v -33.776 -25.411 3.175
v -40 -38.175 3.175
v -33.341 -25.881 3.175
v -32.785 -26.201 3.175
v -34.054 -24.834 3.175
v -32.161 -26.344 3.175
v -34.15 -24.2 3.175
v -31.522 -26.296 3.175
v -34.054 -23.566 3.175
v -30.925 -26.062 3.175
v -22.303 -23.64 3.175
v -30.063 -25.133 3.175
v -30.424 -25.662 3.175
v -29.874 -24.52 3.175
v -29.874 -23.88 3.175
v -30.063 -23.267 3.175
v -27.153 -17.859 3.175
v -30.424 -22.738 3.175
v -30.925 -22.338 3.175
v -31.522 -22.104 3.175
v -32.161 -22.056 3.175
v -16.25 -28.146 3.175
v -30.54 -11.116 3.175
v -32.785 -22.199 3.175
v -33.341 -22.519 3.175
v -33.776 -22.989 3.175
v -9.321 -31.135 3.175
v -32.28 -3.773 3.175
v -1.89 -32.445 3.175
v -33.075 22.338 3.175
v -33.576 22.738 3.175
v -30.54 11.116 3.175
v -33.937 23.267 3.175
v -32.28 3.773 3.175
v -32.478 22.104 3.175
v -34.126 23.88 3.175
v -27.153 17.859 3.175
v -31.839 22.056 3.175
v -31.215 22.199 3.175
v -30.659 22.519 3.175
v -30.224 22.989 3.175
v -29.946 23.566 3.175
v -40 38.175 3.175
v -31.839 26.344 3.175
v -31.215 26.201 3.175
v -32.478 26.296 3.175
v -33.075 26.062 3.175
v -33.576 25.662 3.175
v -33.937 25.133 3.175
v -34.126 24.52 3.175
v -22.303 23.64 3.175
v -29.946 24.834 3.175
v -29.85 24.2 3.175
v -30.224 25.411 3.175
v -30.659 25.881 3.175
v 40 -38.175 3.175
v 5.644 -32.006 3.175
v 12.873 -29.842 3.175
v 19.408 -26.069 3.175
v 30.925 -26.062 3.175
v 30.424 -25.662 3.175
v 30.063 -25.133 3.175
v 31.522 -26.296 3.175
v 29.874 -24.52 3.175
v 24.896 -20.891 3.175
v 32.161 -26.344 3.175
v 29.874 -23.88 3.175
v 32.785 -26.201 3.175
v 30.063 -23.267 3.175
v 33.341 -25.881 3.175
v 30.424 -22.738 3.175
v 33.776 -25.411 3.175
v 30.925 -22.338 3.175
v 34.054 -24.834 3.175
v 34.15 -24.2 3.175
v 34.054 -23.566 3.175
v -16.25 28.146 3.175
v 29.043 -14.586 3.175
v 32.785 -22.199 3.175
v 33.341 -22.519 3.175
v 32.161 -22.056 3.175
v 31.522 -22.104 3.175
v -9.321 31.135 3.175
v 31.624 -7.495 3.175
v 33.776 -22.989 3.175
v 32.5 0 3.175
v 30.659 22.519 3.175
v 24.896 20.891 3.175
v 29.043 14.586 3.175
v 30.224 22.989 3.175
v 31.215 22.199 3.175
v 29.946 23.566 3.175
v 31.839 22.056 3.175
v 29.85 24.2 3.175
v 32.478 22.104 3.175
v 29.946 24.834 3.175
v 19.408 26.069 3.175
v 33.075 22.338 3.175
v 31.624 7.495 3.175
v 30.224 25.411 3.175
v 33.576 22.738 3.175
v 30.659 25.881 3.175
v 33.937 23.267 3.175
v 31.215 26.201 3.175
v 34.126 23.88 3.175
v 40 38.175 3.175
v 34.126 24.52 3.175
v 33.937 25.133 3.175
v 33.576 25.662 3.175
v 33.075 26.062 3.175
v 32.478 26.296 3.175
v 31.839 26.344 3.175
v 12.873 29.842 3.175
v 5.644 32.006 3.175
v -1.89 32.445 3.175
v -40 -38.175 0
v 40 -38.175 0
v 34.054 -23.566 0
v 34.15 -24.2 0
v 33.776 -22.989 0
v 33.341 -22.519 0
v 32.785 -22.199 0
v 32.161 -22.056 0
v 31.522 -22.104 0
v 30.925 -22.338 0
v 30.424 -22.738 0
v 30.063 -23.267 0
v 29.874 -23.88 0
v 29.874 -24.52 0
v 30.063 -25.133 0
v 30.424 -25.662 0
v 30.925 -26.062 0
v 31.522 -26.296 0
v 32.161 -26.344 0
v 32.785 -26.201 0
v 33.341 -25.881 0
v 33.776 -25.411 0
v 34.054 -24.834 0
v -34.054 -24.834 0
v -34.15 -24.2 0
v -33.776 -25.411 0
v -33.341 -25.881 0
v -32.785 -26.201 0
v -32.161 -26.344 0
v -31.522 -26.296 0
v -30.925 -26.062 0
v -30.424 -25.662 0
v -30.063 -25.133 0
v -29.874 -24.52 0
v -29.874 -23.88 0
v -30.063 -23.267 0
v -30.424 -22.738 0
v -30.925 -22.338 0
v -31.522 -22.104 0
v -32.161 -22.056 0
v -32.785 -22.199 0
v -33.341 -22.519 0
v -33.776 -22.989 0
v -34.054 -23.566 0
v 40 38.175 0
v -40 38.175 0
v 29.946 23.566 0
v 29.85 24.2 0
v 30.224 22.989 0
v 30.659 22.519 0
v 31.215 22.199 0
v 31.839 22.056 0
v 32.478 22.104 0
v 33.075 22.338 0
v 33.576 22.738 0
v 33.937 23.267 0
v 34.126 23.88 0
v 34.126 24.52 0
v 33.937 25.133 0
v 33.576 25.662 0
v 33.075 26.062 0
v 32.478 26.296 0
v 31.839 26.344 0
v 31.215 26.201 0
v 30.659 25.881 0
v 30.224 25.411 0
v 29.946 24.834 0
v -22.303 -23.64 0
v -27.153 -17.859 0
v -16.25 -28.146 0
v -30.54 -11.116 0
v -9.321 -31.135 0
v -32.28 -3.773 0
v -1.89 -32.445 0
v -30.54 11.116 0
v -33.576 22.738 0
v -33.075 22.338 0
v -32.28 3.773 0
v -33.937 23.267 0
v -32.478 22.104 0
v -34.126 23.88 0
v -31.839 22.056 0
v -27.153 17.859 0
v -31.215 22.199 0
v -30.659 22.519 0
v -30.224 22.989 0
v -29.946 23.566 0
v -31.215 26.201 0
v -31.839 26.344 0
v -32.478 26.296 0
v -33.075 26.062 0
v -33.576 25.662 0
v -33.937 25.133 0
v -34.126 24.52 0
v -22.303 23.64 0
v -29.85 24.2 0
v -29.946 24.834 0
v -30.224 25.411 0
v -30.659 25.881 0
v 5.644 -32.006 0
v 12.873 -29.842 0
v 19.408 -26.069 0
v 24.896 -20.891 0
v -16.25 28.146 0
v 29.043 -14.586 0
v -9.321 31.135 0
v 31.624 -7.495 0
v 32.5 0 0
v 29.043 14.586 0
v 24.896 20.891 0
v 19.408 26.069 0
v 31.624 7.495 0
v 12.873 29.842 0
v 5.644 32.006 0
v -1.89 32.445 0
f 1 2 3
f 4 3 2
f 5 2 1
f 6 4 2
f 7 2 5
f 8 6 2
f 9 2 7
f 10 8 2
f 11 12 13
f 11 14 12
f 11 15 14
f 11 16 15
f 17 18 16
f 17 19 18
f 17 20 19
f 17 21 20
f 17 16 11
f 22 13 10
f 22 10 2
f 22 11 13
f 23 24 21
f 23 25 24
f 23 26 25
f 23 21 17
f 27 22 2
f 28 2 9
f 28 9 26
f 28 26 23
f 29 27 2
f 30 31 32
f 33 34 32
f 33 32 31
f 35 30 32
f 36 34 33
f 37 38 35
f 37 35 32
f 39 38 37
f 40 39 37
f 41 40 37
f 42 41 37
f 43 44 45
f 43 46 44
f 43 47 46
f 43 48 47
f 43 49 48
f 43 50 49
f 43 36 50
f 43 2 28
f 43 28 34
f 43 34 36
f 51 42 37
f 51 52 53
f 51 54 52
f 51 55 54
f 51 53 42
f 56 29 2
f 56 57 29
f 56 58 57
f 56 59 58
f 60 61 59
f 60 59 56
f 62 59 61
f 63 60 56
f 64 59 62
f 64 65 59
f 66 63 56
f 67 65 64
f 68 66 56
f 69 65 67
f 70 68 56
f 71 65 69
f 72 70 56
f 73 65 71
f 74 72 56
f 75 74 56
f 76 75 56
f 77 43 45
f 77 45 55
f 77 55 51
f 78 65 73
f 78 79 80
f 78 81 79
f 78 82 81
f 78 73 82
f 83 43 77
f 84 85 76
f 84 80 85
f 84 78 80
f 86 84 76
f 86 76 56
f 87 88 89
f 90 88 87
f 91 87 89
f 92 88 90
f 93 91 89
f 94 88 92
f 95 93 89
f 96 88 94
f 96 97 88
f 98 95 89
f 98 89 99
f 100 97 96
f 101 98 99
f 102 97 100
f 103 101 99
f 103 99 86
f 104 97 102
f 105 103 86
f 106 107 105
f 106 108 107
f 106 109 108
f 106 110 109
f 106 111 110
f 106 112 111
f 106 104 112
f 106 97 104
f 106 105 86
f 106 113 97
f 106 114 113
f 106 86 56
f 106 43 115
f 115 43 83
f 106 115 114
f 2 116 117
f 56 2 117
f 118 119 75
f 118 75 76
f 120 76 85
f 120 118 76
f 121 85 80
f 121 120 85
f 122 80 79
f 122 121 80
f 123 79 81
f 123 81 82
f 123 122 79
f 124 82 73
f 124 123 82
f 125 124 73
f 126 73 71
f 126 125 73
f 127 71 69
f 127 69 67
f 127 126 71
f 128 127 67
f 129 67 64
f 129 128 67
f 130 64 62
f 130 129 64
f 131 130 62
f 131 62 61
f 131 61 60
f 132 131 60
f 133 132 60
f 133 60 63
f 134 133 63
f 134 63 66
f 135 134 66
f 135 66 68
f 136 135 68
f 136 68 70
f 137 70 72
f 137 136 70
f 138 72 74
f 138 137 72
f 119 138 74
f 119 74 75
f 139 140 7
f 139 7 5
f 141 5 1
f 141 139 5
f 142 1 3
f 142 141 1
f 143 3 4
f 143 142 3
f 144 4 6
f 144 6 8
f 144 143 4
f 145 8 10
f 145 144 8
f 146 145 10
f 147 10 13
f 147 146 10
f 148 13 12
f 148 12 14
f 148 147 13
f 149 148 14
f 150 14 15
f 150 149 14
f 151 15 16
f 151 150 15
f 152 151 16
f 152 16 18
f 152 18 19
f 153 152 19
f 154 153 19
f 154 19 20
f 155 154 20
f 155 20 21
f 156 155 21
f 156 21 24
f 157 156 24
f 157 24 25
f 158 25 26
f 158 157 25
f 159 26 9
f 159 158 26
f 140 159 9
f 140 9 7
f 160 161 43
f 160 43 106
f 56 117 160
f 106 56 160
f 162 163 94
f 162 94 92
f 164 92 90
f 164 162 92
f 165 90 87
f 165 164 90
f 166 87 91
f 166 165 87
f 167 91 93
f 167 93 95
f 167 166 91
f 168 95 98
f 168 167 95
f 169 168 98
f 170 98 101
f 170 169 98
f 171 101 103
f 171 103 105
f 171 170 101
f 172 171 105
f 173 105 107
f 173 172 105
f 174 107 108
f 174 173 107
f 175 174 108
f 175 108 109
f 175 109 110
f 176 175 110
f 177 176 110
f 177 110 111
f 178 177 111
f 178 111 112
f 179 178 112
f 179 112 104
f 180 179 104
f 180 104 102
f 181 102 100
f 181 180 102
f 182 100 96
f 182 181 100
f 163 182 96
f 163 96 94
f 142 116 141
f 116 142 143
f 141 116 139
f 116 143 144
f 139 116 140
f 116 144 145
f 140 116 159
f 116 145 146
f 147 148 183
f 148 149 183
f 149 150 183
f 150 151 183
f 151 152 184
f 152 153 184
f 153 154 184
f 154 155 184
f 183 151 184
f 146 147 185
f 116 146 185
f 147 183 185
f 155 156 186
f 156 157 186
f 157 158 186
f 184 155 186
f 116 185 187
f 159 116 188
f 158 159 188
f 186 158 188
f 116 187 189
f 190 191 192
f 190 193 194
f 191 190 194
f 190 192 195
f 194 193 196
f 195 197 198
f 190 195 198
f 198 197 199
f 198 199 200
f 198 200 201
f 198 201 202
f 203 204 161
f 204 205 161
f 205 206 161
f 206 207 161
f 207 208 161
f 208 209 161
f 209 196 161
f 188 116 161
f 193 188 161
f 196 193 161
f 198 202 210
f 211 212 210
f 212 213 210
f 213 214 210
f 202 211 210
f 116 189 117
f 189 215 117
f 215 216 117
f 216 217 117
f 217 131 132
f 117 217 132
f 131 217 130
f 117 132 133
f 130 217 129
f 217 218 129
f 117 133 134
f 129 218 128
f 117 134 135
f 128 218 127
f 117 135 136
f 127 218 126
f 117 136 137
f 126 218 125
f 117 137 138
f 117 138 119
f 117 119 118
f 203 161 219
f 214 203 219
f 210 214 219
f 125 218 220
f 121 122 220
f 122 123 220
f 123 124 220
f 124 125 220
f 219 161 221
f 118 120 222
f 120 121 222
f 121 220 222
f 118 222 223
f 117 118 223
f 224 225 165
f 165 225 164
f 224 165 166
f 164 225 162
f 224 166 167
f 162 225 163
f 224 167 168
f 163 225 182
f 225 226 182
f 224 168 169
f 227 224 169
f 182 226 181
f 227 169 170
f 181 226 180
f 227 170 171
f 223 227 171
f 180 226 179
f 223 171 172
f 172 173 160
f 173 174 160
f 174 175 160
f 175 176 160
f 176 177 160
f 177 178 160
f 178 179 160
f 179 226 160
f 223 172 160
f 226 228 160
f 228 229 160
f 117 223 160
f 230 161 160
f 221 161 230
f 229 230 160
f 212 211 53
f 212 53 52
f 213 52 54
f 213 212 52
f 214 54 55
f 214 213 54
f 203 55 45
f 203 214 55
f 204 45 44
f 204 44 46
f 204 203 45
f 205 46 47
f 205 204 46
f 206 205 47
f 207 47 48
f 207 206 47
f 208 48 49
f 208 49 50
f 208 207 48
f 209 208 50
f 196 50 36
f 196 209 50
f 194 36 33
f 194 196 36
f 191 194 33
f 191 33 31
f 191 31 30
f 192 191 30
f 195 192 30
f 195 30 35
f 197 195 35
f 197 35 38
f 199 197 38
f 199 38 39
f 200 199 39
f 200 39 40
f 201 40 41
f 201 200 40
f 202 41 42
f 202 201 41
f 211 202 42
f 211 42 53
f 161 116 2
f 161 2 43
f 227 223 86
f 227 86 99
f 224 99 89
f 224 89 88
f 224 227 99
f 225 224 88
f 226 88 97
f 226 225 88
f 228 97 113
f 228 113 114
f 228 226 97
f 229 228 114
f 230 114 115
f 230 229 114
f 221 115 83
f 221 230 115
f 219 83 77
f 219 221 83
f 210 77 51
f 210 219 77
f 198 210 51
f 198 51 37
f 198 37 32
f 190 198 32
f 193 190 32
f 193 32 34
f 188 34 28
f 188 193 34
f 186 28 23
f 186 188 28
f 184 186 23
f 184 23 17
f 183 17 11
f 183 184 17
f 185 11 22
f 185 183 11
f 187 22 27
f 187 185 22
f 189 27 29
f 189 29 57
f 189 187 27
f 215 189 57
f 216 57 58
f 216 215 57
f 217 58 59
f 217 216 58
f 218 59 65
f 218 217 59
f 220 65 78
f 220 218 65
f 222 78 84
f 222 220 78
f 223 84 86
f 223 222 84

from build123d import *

# Parameters (mm, degrees)
SKETCH1_W           = 80
SKETCH1_H           = 76.35
SKETCH1_R           = 32.5
SKETCH1_R_2         = 2.15
BOSS_EXTRUDE1_DEPTH = 3.175


with BuildPart() as part:
    # Sketch1 → Boss-Extrude1 (new body)
    with BuildSketch(Plane.XY):
        Rectangle(SKETCH1_W, SKETCH1_H)
        Circle(SKETCH1_R, mode=Mode.SUBTRACT)
        with Locations((-32, 24.2)):
            Circle(SKETCH1_R_2, mode=Mode.SUBTRACT)
        with Locations(Location((-32, -24.2, 0), (0, 0, 180))):
            Circle(SKETCH1_R_2, mode=Mode.SUBTRACT)
        with Locations((32, -24.2)):
            Circle(SKETCH1_R_2, mode=Mode.SUBTRACT)
        with Locations(Location((32, 24.2, 0), (0, 0, 180))):
            Circle(SKETCH1_R_2, mode=Mode.SUBTRACT)
    extrude(amount=BOSS_EXTRUDE1_DEPTH)


solid = part.part
